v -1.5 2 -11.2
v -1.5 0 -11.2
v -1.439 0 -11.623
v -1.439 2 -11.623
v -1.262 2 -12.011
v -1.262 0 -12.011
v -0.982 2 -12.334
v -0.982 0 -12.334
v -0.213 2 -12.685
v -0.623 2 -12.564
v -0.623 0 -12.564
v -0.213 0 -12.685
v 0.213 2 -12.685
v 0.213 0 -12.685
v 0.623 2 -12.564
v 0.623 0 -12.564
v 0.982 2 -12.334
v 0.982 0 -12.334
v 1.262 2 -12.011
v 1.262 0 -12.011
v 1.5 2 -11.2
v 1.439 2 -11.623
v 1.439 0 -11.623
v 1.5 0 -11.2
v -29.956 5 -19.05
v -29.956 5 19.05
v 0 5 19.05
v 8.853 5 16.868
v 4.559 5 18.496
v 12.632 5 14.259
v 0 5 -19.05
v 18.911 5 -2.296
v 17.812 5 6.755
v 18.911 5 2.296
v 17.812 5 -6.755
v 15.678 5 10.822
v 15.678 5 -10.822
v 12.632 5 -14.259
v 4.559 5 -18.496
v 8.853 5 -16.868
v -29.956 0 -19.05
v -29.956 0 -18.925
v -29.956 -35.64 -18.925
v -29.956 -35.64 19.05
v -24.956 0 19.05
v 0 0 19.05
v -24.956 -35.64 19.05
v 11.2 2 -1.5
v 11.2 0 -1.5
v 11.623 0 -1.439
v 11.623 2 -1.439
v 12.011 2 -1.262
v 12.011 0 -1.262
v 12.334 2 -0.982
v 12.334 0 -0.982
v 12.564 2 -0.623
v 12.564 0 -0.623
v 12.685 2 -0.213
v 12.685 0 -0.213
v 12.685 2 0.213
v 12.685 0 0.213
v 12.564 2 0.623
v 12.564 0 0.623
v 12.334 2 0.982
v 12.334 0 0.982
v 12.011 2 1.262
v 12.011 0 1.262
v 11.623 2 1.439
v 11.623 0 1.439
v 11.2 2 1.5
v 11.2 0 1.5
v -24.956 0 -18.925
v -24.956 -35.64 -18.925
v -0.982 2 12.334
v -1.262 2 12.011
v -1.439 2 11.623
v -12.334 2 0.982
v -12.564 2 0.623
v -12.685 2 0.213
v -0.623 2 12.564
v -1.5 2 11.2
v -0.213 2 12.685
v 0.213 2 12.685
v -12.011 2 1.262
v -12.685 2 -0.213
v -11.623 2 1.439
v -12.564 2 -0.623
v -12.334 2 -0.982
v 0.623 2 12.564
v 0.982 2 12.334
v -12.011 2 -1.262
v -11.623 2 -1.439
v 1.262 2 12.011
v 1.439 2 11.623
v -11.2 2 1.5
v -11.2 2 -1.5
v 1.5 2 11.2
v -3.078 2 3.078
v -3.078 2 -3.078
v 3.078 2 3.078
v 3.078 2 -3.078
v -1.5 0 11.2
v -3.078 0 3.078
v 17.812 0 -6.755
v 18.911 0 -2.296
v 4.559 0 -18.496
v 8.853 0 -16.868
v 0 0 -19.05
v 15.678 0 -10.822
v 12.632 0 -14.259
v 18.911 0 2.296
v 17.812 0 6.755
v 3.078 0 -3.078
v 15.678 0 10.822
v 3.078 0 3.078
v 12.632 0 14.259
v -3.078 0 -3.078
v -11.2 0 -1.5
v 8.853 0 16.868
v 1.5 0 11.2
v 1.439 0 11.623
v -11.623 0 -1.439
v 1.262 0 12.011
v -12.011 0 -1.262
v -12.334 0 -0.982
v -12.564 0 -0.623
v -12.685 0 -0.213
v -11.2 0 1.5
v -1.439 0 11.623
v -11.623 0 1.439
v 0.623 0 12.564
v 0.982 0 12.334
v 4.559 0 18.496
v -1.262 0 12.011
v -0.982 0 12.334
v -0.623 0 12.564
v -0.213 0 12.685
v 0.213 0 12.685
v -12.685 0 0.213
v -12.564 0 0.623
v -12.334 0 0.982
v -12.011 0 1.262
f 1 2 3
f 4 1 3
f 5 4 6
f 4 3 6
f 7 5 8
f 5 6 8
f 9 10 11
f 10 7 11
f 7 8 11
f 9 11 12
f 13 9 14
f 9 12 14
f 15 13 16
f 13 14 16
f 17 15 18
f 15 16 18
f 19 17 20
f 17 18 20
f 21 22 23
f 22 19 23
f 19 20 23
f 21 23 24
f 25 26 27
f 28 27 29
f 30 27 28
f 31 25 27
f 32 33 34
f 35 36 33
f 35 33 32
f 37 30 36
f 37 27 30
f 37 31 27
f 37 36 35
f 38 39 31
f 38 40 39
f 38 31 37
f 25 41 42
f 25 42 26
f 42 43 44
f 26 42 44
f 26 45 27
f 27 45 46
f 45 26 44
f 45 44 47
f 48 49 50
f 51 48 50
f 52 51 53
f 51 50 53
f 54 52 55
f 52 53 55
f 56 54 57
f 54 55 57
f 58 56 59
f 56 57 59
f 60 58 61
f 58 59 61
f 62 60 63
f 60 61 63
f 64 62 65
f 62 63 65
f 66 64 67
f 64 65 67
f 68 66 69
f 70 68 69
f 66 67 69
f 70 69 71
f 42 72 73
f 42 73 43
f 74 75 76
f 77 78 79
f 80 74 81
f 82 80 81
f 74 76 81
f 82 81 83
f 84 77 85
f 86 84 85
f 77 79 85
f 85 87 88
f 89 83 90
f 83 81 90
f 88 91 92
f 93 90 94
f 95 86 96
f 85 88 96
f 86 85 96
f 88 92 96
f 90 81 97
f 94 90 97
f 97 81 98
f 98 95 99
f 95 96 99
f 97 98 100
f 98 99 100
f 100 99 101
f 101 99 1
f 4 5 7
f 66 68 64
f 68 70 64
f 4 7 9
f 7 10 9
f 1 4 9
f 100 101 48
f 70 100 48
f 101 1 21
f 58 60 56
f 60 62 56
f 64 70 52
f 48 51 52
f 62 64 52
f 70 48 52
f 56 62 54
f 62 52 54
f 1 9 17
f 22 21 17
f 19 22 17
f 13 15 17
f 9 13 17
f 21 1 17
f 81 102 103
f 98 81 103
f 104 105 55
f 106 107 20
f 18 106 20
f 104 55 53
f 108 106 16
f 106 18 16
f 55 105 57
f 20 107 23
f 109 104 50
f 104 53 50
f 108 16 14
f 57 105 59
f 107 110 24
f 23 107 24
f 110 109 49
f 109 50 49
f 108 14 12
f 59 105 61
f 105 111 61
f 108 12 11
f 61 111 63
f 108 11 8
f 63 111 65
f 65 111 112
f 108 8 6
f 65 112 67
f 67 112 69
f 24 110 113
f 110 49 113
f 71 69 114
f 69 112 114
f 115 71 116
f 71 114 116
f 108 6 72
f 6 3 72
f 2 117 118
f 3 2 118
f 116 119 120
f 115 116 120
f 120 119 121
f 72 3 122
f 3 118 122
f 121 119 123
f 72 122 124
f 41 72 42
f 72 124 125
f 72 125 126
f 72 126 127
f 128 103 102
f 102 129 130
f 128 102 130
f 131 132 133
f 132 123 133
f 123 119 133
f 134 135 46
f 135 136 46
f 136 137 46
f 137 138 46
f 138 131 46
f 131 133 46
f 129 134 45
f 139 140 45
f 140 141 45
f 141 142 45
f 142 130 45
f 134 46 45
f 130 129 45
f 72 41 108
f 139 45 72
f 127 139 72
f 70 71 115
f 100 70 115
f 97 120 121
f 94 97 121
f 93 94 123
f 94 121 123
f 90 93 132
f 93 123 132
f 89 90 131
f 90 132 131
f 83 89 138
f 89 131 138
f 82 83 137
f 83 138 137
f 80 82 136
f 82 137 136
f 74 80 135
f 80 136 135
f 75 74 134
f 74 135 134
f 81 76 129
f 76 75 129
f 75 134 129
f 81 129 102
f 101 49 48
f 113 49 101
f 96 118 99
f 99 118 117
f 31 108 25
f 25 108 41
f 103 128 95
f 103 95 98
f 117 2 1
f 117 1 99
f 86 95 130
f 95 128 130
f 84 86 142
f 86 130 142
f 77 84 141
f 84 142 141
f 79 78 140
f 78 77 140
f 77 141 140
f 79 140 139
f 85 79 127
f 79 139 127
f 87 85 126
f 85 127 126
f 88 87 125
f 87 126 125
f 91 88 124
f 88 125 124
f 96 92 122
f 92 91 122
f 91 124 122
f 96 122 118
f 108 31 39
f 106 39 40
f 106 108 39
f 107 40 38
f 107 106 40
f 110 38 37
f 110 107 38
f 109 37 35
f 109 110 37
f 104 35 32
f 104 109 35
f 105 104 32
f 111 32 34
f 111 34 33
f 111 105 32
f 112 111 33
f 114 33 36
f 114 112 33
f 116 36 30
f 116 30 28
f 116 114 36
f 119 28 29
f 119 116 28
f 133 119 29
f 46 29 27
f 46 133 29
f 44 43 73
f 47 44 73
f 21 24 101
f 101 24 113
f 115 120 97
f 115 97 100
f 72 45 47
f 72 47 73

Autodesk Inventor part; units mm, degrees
ref_plane "YZ Plane" through (0, 0, 0) normal (1, 0, 0) x (0, 1, 0)
ref_plane "XZ Plane" through (0, 0, 0) normal (0, 1, 0) x (-1, 0, 0)
ref_plane "XY Plane" through (0, 0, 0) normal (0, 0, 1) x (1, 0, 0)
sketch "Sketch1" plane through (0, 0, 0) normal (0, 1, 0) x (-1, 0, 0)
  circle A0 centre (0, 0) radius 19.05
  circle A1 centre (0, 0) radius 12.7
  circle A2 centre (0, 0) radius 4
  line L0 (12.7, 0) -> (11.2, 0)
  circle A3 centre (11.2, 0) radius 1.5
  line L1 (11.2, 1.5) -> (2.3814, 3.2139)
  line L2 (11.2, -1.5) -> (2.3814, -3.2139)
  circle A4 centre (0, 11.2) radius 1.5
  line L3 (-1.5, 11.2) -> (-3.2139, 2.3814)
  line L4 (1.5, 11.2) -> (3.2139, 2.3814)
  circle A5 centre (-11.2, 0) radius 1.5
  line L5 (-11.2, -1.5) -> (-2.3814, -3.2139)
  line L6 (-11.2, 1.5) -> (-2.3814, 3.2139)
  circle A6 centre (0, -11.2) radius 1.5
  line L7 (1.5, -11.2) -> (3.2139, -2.3814)
  line L8 (-1.5, -11.2) -> (-3.2139, -2.3814)
  line L9 (0, -19.05) -> (29.9563, -19.05)
  line L10 (29.9563, -19.05) -> (29.9563, 19.05)
  line L11 (29.9563, 19.05) -> (0, 19.05)
  line L12 (0, 19.05) -> (0, -19.05)
  point P0 (0, 12.7)
  point P1 (-12.7, 0)
  point P2 (0, -12.7)
  point P3 (-3.0784, -3.0784)
  point P4 (-3.0784, 3.0784)
  point P5 (3.0784, 3.0784)
  point P6 (3.0784, -3.0784)
  point P7 (0, 19.05)
  dimension "d2" = 38.1
  dimension "d3" = 25.4
  dimension "d4" = 8
  dimension "d5" = 1.5
  dimension "d6" = 360
extrude "Extrusion1" add sketch "Sketch1" along normal blind 2 contours A0 L12 A1 | A0 L11 L10 L9 | L12 A1 A0 | A4 L3 L6 A5 A1 | A1 A3 L1 L4 A4 | A6 L7 L2 A3 A1 | A1 A5 L5 L8 A6
sketch "Sketch2" plane through (0, 2, 0) normal (0, 1, 0) x (1, 0, 0)
  line L0 (0, 19.05) -> (-29.9563, 19.05) projected
  line L1 (-29.9563, -19.05) -> (0, -19.05)
  line L2 (0, -19.05) -> (0, 19.05)
  line L3 (0, 19.05) -> (-29.9563, 19.05)
  line L4 (-29.9563, 19.05) -> (-29.9563, -19.05)
  circle A0 centre (0, 0) radius 19.05
  point P0 (0, -19.05)
extrude "Extrusion2" add sketch "Sketch2" along normal blind 3
sketch "Sketch3" plane through (0, 0, 0) normal (0, -1, 0) x (1, 0, 0)
  point P0 (0, 0)
sketch "Sketch4" plane through (0, 5, 0) normal (0, 1, 0) x (1, 0, 0)
  line L0 (-29.9563, -19.05) -> (-24.9563, -19.05)
  line L1 (-24.9563, -19.05) -> (-24.9563, 18.9252)
  line L2 (-24.9563, 18.9252) -> (-29.9563, 18.9252)
  line L3 (-29.9563, 18.9252) -> (-29.9563, -19.05)
  point P0 (0, 0)
  dimension "d11" = 5
extrude "Extrusion3" add sketch "Sketch4" against normal blind 40.64
properties part number "turret y top"
